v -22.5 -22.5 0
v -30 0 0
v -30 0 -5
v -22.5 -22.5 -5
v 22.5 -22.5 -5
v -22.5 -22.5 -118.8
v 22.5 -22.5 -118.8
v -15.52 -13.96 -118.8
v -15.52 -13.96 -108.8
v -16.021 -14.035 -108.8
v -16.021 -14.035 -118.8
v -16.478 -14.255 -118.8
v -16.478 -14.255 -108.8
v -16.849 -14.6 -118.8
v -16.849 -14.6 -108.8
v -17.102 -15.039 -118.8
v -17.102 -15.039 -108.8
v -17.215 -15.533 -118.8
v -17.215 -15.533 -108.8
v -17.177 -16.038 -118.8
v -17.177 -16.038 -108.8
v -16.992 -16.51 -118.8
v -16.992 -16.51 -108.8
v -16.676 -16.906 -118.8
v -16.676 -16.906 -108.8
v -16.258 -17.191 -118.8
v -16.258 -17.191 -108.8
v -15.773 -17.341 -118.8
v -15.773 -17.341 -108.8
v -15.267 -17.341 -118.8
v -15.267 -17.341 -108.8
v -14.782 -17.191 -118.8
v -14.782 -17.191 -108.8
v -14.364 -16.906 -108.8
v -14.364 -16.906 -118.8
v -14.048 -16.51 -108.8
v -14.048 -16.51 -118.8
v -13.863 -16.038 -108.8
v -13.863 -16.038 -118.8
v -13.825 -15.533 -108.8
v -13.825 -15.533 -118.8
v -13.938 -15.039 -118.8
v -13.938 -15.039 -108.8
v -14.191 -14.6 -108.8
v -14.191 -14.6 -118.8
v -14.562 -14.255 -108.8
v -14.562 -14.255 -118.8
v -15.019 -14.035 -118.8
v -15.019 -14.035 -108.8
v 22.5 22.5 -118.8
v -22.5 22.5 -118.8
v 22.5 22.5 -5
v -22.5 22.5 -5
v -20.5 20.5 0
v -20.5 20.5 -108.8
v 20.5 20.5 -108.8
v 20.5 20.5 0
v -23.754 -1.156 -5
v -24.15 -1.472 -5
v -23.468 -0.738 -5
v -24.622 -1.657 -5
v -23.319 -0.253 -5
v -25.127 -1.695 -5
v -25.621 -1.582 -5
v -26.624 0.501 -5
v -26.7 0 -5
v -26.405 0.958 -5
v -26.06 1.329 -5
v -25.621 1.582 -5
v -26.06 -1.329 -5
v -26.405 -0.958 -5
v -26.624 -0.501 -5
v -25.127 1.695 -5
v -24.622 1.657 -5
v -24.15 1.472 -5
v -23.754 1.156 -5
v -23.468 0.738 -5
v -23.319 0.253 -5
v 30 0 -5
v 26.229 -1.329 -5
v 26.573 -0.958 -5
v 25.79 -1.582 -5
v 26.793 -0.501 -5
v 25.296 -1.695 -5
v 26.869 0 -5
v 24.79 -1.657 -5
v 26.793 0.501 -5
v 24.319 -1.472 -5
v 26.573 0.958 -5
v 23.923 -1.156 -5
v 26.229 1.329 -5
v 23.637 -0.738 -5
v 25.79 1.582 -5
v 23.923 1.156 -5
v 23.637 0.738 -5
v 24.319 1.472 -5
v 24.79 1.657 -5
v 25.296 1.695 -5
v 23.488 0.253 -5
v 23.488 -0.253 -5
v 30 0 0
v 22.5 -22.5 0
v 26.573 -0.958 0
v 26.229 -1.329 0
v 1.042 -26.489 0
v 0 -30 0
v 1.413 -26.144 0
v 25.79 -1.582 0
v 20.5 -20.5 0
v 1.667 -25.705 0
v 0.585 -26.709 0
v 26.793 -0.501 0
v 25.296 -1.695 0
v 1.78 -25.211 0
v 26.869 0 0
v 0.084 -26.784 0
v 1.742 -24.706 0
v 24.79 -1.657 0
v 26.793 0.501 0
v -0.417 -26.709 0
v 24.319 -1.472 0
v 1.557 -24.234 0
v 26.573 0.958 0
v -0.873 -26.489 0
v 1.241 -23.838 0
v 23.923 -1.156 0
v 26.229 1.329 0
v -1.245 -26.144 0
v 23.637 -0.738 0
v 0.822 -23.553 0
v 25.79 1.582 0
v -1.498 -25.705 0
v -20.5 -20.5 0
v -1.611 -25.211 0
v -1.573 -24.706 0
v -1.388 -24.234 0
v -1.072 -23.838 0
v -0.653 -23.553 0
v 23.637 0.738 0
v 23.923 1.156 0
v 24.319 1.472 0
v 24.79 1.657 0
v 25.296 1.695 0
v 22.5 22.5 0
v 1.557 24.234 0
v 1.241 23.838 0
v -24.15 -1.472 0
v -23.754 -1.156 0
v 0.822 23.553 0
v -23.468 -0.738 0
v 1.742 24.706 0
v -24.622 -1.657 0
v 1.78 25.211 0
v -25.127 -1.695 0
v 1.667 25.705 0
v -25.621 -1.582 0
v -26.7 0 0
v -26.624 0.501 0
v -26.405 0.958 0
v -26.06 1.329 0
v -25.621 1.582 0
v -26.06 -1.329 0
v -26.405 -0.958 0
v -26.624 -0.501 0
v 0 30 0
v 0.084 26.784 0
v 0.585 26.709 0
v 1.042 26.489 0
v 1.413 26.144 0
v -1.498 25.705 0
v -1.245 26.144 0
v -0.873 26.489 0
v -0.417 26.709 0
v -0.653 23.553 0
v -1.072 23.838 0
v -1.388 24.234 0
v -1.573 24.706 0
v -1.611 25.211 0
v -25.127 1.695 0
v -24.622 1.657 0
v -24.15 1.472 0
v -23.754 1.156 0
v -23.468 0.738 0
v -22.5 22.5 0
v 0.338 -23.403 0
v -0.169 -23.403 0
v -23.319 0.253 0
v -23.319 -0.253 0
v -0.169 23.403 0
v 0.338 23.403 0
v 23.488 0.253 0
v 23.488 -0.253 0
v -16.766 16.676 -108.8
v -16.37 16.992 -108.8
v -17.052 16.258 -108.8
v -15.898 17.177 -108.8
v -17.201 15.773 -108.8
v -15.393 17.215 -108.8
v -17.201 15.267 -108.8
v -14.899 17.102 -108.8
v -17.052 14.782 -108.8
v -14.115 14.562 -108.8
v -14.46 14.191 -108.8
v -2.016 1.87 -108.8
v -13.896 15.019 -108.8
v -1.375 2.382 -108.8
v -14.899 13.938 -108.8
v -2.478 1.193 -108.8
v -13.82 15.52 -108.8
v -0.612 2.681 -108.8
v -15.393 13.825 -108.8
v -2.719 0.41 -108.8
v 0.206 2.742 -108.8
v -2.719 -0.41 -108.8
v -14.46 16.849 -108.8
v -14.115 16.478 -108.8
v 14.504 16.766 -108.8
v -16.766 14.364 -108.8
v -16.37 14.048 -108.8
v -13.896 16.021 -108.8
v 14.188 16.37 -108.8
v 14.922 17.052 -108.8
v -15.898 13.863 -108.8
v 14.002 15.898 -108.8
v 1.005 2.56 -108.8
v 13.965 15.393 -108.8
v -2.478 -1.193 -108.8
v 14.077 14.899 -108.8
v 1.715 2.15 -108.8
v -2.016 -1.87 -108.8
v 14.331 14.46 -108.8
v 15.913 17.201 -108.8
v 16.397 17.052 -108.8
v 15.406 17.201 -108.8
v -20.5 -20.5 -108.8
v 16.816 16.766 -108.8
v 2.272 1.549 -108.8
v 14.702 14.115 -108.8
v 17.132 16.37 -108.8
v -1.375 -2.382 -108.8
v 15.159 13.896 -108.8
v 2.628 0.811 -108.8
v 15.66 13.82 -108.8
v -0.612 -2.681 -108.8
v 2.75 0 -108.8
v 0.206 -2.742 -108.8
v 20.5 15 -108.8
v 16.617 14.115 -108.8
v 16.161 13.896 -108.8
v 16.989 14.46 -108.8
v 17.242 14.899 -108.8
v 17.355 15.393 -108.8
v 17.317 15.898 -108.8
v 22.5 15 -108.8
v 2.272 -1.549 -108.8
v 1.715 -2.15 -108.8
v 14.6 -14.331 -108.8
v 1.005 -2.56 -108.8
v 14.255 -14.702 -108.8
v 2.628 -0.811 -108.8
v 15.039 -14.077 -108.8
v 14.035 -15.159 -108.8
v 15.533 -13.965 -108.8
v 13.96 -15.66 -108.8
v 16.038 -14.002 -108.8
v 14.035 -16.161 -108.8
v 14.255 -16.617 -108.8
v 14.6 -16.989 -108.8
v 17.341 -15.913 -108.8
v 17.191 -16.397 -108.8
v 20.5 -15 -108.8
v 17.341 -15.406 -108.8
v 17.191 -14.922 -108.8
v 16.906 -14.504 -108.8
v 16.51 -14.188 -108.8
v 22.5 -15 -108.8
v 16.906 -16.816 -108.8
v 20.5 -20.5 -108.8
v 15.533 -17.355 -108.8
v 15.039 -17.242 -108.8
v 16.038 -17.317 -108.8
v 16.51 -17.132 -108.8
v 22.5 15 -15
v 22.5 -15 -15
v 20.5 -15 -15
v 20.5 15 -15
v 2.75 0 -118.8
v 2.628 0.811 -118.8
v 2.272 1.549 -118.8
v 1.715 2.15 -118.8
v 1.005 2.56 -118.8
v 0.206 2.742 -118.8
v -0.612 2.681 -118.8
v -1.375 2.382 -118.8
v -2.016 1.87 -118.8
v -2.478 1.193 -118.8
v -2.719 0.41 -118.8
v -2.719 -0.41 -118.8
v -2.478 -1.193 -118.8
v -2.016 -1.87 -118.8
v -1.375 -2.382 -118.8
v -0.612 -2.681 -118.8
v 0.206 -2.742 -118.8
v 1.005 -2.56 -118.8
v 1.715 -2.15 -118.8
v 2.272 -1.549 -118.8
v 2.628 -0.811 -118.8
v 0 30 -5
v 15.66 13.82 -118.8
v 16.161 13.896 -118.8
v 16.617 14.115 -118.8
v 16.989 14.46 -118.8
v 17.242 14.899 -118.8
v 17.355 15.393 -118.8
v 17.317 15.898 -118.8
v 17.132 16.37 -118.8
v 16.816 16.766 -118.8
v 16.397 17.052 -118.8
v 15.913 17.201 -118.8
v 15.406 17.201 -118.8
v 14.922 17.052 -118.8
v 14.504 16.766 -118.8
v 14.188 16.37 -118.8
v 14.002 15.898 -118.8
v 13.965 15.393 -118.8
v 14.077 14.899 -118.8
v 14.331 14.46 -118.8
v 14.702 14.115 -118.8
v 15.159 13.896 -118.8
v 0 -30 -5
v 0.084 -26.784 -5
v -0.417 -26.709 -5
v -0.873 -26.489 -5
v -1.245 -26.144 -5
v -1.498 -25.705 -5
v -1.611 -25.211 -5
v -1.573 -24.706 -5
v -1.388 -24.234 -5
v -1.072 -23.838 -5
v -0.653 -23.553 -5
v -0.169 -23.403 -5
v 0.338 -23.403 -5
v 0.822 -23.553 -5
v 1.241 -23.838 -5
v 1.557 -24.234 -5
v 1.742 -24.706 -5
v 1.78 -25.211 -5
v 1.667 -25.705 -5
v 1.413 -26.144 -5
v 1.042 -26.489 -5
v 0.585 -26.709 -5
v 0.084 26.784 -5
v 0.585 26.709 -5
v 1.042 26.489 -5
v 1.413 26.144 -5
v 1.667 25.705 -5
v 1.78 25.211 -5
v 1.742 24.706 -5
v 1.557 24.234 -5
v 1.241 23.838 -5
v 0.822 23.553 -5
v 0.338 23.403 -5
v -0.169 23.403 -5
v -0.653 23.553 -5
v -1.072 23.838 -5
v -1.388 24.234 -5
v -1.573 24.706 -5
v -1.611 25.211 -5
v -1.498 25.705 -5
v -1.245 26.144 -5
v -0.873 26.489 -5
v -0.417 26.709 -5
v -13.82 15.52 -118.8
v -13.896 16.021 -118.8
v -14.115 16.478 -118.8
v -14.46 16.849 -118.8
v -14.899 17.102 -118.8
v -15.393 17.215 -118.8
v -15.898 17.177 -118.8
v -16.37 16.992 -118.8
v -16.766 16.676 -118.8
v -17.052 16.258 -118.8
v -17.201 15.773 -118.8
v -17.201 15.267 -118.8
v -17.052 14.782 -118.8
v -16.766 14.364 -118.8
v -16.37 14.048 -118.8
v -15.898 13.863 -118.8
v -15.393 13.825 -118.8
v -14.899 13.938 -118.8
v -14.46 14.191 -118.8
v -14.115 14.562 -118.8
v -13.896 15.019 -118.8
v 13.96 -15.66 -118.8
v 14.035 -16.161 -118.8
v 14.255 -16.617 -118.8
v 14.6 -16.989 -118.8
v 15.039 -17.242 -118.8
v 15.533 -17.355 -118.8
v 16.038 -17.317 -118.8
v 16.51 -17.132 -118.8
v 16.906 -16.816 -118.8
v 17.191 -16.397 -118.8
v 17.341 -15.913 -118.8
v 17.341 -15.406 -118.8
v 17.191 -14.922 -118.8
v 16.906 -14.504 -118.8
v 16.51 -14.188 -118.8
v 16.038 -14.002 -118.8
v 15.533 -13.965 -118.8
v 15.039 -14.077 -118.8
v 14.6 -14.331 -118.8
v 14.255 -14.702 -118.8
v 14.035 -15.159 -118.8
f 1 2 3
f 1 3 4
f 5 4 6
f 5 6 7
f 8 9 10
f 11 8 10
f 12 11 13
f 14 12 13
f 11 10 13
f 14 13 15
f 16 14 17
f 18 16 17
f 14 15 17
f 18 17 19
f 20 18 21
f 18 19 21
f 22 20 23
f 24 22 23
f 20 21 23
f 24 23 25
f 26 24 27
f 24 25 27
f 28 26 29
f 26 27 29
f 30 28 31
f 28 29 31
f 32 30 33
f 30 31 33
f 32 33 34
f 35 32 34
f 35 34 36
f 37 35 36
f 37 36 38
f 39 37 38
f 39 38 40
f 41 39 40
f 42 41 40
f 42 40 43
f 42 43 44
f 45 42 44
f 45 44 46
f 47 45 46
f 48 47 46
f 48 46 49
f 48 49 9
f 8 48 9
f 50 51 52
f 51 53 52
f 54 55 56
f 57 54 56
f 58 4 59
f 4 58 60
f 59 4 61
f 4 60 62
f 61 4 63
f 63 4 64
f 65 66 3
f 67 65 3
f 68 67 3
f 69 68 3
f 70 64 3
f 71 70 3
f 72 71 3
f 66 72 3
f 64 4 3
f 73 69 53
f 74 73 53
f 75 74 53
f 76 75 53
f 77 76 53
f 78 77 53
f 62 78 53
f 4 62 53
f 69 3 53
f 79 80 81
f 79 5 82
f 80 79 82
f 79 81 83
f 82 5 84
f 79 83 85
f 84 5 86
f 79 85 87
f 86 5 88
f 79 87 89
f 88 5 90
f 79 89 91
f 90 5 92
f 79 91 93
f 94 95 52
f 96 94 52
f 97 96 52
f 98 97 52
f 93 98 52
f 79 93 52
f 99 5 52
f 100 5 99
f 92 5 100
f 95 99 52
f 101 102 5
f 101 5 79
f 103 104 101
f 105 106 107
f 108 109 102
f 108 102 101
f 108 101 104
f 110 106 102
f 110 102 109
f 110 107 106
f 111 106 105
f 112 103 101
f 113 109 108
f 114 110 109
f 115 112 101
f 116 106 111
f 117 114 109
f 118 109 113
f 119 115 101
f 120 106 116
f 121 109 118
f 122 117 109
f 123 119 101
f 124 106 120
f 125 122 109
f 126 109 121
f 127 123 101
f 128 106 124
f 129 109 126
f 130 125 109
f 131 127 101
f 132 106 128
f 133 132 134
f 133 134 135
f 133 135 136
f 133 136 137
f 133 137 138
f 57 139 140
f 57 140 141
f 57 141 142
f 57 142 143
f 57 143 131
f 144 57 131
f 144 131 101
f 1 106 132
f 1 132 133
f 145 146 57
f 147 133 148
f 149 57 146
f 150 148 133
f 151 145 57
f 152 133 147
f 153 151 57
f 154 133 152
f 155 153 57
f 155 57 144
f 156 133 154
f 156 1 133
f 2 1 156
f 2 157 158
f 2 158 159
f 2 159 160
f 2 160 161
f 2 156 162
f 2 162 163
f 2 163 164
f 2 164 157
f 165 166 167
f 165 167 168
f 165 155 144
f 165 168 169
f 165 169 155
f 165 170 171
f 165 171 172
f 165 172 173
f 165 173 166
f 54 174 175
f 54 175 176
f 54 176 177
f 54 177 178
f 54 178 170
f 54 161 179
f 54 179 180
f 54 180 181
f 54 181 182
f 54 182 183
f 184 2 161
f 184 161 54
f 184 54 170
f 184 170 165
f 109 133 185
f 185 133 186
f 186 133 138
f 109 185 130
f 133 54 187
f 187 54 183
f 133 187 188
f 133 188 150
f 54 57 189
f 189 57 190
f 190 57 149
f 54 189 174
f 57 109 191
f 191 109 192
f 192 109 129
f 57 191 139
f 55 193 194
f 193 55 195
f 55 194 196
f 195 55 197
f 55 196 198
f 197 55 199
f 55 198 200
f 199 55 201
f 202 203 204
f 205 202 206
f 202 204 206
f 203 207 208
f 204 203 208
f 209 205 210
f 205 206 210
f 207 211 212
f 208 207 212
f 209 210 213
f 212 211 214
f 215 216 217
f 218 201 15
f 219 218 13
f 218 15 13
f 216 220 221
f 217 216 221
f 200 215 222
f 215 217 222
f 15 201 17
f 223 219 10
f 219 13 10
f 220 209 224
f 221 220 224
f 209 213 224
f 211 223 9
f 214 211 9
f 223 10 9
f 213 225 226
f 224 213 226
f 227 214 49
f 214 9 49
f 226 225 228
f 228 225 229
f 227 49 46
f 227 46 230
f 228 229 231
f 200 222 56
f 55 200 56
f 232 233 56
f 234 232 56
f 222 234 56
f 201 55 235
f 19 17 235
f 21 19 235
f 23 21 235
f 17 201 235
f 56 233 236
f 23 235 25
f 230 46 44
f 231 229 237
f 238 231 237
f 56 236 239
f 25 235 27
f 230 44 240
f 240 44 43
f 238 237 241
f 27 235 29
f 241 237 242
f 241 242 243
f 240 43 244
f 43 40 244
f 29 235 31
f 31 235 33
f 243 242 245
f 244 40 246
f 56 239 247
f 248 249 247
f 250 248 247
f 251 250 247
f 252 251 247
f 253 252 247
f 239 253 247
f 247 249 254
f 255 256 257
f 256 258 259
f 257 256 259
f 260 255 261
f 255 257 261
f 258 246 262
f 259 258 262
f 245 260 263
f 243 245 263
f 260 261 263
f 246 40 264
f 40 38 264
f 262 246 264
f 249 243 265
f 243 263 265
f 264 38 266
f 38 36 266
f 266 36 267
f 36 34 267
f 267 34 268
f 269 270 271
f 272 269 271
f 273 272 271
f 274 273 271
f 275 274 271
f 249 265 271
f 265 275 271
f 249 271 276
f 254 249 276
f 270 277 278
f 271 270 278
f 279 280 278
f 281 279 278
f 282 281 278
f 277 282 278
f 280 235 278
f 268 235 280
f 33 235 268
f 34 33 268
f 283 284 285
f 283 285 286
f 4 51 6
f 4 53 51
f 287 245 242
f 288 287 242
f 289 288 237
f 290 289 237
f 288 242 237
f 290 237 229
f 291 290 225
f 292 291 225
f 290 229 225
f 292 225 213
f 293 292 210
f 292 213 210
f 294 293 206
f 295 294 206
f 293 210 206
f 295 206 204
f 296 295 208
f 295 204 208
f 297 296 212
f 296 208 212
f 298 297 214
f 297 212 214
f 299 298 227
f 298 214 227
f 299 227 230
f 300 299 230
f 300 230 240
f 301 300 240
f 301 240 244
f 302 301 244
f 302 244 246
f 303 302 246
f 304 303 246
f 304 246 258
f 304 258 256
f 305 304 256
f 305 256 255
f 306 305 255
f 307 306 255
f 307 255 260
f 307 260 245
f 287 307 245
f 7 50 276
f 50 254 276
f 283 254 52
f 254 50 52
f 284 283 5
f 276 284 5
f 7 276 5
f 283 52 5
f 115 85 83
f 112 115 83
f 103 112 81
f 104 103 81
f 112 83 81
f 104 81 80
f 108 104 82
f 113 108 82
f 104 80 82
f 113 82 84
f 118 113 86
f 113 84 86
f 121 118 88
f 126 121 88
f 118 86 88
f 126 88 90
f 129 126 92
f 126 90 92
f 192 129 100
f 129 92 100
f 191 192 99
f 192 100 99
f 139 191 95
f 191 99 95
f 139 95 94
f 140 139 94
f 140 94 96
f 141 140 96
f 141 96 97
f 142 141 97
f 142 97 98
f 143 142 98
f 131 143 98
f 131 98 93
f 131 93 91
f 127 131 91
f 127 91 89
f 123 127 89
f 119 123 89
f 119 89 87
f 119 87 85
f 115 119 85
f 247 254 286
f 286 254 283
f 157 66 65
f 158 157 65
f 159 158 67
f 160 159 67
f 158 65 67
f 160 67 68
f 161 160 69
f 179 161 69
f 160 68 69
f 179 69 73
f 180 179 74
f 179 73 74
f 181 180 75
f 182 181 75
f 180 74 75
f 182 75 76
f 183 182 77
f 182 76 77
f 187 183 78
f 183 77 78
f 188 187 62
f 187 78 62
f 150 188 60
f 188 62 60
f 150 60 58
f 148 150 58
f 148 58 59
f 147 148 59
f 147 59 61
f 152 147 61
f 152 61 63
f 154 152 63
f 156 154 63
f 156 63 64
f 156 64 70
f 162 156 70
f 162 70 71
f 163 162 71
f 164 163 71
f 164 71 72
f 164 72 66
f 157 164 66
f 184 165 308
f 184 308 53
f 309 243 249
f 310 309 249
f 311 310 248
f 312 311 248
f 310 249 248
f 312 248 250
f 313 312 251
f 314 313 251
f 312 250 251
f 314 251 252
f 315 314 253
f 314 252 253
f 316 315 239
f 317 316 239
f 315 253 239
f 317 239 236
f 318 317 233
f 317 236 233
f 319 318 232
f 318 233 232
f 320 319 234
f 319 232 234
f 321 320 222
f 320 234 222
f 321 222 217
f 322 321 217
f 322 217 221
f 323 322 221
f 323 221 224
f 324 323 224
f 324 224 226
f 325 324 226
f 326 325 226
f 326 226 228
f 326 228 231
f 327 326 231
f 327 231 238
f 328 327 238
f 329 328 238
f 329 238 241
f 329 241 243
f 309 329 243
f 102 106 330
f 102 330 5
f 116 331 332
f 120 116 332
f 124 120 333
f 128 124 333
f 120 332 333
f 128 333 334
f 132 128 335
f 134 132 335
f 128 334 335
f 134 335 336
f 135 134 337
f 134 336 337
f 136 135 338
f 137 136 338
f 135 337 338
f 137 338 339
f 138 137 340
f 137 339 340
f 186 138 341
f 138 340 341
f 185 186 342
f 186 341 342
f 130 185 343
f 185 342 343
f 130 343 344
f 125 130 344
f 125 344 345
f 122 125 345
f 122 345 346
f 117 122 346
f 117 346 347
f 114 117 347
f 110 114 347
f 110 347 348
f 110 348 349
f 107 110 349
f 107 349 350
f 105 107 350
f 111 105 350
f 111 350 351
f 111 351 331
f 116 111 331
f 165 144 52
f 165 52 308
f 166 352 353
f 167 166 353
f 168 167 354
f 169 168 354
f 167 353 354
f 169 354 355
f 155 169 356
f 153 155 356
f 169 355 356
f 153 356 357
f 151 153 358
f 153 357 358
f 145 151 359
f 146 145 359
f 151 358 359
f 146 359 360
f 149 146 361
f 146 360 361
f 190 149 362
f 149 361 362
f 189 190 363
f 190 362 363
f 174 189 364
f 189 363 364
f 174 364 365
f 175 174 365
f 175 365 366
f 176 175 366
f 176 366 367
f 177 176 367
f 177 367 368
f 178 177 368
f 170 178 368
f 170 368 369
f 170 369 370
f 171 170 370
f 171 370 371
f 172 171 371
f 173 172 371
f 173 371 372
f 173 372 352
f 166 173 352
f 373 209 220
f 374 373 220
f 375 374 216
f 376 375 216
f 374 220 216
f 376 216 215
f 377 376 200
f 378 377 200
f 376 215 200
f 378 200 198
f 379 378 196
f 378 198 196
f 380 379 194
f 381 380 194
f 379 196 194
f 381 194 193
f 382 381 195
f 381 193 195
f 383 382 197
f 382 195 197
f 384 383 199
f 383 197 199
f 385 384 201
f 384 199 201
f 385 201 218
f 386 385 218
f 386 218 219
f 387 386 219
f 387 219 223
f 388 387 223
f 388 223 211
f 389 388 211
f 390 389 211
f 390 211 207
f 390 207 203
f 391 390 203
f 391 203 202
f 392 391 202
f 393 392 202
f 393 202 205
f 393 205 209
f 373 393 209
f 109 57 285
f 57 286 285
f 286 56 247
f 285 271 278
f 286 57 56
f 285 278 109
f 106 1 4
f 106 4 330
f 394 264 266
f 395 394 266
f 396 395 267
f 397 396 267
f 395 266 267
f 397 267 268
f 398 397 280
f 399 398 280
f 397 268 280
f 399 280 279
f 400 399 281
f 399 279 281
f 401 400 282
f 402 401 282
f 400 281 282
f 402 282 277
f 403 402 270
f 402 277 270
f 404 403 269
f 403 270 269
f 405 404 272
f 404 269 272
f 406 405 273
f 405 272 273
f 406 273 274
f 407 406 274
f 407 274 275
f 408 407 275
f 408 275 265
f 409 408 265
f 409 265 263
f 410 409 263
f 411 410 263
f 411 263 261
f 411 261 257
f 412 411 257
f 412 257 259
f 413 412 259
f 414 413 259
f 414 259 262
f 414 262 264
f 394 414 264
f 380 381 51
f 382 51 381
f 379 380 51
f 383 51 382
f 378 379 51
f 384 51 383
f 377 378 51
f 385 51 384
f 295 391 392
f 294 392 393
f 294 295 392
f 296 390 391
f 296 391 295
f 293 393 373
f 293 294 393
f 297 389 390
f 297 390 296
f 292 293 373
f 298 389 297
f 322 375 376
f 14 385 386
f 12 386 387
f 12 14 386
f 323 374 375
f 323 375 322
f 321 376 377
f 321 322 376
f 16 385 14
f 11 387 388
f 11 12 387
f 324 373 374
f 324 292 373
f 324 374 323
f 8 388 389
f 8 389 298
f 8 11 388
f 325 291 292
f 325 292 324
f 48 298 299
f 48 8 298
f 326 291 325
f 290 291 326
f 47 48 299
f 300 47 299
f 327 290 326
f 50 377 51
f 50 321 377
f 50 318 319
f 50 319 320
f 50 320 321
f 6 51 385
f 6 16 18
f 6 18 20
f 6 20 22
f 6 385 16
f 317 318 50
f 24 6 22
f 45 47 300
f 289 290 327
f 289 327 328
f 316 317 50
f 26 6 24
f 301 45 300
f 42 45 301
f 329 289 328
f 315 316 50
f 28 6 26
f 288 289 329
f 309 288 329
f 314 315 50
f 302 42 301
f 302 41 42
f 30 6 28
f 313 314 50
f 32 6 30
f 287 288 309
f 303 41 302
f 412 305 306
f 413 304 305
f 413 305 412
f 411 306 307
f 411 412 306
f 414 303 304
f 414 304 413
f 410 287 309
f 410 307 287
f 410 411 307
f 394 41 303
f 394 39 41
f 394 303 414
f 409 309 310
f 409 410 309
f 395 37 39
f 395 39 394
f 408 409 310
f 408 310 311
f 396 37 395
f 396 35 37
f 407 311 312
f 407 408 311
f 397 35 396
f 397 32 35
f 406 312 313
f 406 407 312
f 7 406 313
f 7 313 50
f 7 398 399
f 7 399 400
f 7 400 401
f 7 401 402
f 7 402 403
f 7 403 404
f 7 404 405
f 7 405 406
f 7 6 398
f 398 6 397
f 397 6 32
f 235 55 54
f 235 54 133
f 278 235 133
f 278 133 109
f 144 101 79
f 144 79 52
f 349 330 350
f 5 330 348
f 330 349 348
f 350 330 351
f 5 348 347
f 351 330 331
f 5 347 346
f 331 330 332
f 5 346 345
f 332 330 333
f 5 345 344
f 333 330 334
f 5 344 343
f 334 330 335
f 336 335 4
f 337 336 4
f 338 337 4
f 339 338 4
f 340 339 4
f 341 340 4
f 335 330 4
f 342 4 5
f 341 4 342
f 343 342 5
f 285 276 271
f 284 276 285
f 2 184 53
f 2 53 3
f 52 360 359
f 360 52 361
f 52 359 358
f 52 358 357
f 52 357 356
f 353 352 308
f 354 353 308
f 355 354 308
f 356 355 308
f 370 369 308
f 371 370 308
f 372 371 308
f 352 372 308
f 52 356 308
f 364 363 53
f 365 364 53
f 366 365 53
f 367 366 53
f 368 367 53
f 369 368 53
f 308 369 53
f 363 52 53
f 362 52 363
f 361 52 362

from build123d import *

# Parameters (mm, degrees)
ESTRUSIONE_ESTRUSIONE1_DEPTH = 5
FORO_PER_VITE_M3_1_D         = 3.4
RIPETIZIONECIRCOLARE1_COUNT  = 4
SCHIZZO4_W                   = 45
SCHIZZO4_H                   = 45
ESTRUSIONE_ESTRUSIONE2_DEPTH = 103.8
SCHIZZO5_W                   = 41
SCHIZZO5_H                   = 41
TAGLIO_ESTRUSIONE1_DEPTH     = 117.779450247
TAGLIO_ESTRUSIONE2_REACH     = 126.474
SCHIZZO6_W                   = 30
SCHIZZO6_H                   = 93.8
SCHIZZO7_W                   = 45
SCHIZZO7_H                   = 45
ESTRUSIONE_ESTRUSIONE3_DEPTH = 10
JOINT_MOTOR_HOUSING_D        = 3.4
RIPETIZIONECIRCOLARE2_COUNT  = 4
JOINT_MOTOR_ARM_D            = 5.5


with BuildPart() as part:
    # Schizzo1 → Estrusione-Estrusione1 (new body)
    with BuildSketch(Plane(origin=(0, 0, 0), x_dir=(0, 1, 0), z_dir=(0, 0, 1))):
        Polygon((-22.5, 22.5), (-30, 0), (-22.5, -22.5), (0, -30), (22.5, -22.5), (30, 0), (22.5, 22.5), (0, 30), align=None)
    extrude(amount=-ESTRUSIONE_ESTRUSIONE1_DEPTH)

    # Foro per Vite M3-1 (through all)
    with Locations(Plane.XY):
        with Locations((-25, 0)):
            foro_per_vite_m3_1 = Hole(FORO_PER_VITE_M3_1_D / 2)

    # RipetizioneCircolare1: Foro per Vite M3-1 ×4 about axis
    ripetizionecircolare1_axis = Axis((0.084350334, 0, 0), (0, 0, 1))
    for i in range(1, RIPETIZIONECIRCOLARE1_COUNT):
        add(foro_per_vite_m3_1.rotate(ripetizionecircolare1_axis, i * 360 / RIPETIZIONECIRCOLARE1_COUNT), mode=Mode.SUBTRACT)

    # Schizzo4 → Estrusione-Estrusione2 (add)
    with BuildSketch(Plane(origin=(0, 0, -5), x_dir=(1, 0, 0), z_dir=(0, 0, -1))):
        Rectangle(SCHIZZO4_W, SCHIZZO4_H)
    extrude(amount=ESTRUSIONE_ESTRUSIONE2_DEPTH)

    # Schizzo5 → Taglio-Estrusione1 (cut, through all)
    with BuildSketch(Plane(origin=(0, 0, -108.8), x_dir=(1, 0, 0), z_dir=(0, 0, -1))):
        Rectangle(SCHIZZO5_W, SCHIZZO5_H)
    extrude(amount=-TAGLIO_ESTRUSIONE1_DEPTH, mode=Mode.SUBTRACT)

    # Schizzo6 → Taglio-Estrusione2 (cut, up to next)
    with BuildSketch(Plane.YZ.offset(22.5), mode=Mode.PRIVATE) as taglio_estrusione2_sk1:
        with Locations((0, -61.9)):
            Rectangle(SCHIZZO6_W, SCHIZZO6_H)
    taglio_estrusione2_tool1 = extrude(taglio_estrusione2_sk1.sketch, amount=-TAGLIO_ESTRUSIONE2_REACH, mode=Mode.PRIVATE) & part.part
    add(taglio_estrusione2_tool1.solids().sort_by_distance((22.5, 0, -61.9))[0], mode=Mode.SUBTRACT)

    # Schizzo7 → Estrusione-Estrusione3 (add)
    with BuildSketch(Plane(origin=(0, 0, -108.8), x_dir=(1, 0, 0), z_dir=(0, 0, -1))):
        Rectangle(SCHIZZO7_W, SCHIZZO7_H)
    extrude(amount=ESTRUSIONE_ESTRUSIONE3_DEPTH)

    # Joint-motor-housing (through all)
    with Locations(Plane(origin=(0, 0, -118.8), x_dir=(-1, 0, 0), z_dir=(0, 0, -1))):
        with Locations((15.52, 15.52)):
            joint_motor_housing = Hole(JOINT_MOTOR_HOUSING_D / 2)

    # RipetizioneCircolare2: Joint-motor-housing ×4 about axis
    ripetizionecircolare2_axis = Axis((0.069898196, -0.069898196, 0), (0, 0, 1))
    for i in range(1, RIPETIZIONECIRCOLARE2_COUNT):
        add(joint_motor_housing.rotate(ripetizionecircolare2_axis, i * 360 / RIPETIZIONECIRCOLARE2_COUNT), mode=Mode.SUBTRACT)

    # Joint-motor-arm (through all)
    with Locations(Plane(origin=(0, 0, -118.8), x_dir=(-1, 0, 0), z_dir=(0, 0, -1))):
        with Locations((0, 0)):
            Hole(JOINT_MOTOR_ARM_D / 2)


solid = part.part
